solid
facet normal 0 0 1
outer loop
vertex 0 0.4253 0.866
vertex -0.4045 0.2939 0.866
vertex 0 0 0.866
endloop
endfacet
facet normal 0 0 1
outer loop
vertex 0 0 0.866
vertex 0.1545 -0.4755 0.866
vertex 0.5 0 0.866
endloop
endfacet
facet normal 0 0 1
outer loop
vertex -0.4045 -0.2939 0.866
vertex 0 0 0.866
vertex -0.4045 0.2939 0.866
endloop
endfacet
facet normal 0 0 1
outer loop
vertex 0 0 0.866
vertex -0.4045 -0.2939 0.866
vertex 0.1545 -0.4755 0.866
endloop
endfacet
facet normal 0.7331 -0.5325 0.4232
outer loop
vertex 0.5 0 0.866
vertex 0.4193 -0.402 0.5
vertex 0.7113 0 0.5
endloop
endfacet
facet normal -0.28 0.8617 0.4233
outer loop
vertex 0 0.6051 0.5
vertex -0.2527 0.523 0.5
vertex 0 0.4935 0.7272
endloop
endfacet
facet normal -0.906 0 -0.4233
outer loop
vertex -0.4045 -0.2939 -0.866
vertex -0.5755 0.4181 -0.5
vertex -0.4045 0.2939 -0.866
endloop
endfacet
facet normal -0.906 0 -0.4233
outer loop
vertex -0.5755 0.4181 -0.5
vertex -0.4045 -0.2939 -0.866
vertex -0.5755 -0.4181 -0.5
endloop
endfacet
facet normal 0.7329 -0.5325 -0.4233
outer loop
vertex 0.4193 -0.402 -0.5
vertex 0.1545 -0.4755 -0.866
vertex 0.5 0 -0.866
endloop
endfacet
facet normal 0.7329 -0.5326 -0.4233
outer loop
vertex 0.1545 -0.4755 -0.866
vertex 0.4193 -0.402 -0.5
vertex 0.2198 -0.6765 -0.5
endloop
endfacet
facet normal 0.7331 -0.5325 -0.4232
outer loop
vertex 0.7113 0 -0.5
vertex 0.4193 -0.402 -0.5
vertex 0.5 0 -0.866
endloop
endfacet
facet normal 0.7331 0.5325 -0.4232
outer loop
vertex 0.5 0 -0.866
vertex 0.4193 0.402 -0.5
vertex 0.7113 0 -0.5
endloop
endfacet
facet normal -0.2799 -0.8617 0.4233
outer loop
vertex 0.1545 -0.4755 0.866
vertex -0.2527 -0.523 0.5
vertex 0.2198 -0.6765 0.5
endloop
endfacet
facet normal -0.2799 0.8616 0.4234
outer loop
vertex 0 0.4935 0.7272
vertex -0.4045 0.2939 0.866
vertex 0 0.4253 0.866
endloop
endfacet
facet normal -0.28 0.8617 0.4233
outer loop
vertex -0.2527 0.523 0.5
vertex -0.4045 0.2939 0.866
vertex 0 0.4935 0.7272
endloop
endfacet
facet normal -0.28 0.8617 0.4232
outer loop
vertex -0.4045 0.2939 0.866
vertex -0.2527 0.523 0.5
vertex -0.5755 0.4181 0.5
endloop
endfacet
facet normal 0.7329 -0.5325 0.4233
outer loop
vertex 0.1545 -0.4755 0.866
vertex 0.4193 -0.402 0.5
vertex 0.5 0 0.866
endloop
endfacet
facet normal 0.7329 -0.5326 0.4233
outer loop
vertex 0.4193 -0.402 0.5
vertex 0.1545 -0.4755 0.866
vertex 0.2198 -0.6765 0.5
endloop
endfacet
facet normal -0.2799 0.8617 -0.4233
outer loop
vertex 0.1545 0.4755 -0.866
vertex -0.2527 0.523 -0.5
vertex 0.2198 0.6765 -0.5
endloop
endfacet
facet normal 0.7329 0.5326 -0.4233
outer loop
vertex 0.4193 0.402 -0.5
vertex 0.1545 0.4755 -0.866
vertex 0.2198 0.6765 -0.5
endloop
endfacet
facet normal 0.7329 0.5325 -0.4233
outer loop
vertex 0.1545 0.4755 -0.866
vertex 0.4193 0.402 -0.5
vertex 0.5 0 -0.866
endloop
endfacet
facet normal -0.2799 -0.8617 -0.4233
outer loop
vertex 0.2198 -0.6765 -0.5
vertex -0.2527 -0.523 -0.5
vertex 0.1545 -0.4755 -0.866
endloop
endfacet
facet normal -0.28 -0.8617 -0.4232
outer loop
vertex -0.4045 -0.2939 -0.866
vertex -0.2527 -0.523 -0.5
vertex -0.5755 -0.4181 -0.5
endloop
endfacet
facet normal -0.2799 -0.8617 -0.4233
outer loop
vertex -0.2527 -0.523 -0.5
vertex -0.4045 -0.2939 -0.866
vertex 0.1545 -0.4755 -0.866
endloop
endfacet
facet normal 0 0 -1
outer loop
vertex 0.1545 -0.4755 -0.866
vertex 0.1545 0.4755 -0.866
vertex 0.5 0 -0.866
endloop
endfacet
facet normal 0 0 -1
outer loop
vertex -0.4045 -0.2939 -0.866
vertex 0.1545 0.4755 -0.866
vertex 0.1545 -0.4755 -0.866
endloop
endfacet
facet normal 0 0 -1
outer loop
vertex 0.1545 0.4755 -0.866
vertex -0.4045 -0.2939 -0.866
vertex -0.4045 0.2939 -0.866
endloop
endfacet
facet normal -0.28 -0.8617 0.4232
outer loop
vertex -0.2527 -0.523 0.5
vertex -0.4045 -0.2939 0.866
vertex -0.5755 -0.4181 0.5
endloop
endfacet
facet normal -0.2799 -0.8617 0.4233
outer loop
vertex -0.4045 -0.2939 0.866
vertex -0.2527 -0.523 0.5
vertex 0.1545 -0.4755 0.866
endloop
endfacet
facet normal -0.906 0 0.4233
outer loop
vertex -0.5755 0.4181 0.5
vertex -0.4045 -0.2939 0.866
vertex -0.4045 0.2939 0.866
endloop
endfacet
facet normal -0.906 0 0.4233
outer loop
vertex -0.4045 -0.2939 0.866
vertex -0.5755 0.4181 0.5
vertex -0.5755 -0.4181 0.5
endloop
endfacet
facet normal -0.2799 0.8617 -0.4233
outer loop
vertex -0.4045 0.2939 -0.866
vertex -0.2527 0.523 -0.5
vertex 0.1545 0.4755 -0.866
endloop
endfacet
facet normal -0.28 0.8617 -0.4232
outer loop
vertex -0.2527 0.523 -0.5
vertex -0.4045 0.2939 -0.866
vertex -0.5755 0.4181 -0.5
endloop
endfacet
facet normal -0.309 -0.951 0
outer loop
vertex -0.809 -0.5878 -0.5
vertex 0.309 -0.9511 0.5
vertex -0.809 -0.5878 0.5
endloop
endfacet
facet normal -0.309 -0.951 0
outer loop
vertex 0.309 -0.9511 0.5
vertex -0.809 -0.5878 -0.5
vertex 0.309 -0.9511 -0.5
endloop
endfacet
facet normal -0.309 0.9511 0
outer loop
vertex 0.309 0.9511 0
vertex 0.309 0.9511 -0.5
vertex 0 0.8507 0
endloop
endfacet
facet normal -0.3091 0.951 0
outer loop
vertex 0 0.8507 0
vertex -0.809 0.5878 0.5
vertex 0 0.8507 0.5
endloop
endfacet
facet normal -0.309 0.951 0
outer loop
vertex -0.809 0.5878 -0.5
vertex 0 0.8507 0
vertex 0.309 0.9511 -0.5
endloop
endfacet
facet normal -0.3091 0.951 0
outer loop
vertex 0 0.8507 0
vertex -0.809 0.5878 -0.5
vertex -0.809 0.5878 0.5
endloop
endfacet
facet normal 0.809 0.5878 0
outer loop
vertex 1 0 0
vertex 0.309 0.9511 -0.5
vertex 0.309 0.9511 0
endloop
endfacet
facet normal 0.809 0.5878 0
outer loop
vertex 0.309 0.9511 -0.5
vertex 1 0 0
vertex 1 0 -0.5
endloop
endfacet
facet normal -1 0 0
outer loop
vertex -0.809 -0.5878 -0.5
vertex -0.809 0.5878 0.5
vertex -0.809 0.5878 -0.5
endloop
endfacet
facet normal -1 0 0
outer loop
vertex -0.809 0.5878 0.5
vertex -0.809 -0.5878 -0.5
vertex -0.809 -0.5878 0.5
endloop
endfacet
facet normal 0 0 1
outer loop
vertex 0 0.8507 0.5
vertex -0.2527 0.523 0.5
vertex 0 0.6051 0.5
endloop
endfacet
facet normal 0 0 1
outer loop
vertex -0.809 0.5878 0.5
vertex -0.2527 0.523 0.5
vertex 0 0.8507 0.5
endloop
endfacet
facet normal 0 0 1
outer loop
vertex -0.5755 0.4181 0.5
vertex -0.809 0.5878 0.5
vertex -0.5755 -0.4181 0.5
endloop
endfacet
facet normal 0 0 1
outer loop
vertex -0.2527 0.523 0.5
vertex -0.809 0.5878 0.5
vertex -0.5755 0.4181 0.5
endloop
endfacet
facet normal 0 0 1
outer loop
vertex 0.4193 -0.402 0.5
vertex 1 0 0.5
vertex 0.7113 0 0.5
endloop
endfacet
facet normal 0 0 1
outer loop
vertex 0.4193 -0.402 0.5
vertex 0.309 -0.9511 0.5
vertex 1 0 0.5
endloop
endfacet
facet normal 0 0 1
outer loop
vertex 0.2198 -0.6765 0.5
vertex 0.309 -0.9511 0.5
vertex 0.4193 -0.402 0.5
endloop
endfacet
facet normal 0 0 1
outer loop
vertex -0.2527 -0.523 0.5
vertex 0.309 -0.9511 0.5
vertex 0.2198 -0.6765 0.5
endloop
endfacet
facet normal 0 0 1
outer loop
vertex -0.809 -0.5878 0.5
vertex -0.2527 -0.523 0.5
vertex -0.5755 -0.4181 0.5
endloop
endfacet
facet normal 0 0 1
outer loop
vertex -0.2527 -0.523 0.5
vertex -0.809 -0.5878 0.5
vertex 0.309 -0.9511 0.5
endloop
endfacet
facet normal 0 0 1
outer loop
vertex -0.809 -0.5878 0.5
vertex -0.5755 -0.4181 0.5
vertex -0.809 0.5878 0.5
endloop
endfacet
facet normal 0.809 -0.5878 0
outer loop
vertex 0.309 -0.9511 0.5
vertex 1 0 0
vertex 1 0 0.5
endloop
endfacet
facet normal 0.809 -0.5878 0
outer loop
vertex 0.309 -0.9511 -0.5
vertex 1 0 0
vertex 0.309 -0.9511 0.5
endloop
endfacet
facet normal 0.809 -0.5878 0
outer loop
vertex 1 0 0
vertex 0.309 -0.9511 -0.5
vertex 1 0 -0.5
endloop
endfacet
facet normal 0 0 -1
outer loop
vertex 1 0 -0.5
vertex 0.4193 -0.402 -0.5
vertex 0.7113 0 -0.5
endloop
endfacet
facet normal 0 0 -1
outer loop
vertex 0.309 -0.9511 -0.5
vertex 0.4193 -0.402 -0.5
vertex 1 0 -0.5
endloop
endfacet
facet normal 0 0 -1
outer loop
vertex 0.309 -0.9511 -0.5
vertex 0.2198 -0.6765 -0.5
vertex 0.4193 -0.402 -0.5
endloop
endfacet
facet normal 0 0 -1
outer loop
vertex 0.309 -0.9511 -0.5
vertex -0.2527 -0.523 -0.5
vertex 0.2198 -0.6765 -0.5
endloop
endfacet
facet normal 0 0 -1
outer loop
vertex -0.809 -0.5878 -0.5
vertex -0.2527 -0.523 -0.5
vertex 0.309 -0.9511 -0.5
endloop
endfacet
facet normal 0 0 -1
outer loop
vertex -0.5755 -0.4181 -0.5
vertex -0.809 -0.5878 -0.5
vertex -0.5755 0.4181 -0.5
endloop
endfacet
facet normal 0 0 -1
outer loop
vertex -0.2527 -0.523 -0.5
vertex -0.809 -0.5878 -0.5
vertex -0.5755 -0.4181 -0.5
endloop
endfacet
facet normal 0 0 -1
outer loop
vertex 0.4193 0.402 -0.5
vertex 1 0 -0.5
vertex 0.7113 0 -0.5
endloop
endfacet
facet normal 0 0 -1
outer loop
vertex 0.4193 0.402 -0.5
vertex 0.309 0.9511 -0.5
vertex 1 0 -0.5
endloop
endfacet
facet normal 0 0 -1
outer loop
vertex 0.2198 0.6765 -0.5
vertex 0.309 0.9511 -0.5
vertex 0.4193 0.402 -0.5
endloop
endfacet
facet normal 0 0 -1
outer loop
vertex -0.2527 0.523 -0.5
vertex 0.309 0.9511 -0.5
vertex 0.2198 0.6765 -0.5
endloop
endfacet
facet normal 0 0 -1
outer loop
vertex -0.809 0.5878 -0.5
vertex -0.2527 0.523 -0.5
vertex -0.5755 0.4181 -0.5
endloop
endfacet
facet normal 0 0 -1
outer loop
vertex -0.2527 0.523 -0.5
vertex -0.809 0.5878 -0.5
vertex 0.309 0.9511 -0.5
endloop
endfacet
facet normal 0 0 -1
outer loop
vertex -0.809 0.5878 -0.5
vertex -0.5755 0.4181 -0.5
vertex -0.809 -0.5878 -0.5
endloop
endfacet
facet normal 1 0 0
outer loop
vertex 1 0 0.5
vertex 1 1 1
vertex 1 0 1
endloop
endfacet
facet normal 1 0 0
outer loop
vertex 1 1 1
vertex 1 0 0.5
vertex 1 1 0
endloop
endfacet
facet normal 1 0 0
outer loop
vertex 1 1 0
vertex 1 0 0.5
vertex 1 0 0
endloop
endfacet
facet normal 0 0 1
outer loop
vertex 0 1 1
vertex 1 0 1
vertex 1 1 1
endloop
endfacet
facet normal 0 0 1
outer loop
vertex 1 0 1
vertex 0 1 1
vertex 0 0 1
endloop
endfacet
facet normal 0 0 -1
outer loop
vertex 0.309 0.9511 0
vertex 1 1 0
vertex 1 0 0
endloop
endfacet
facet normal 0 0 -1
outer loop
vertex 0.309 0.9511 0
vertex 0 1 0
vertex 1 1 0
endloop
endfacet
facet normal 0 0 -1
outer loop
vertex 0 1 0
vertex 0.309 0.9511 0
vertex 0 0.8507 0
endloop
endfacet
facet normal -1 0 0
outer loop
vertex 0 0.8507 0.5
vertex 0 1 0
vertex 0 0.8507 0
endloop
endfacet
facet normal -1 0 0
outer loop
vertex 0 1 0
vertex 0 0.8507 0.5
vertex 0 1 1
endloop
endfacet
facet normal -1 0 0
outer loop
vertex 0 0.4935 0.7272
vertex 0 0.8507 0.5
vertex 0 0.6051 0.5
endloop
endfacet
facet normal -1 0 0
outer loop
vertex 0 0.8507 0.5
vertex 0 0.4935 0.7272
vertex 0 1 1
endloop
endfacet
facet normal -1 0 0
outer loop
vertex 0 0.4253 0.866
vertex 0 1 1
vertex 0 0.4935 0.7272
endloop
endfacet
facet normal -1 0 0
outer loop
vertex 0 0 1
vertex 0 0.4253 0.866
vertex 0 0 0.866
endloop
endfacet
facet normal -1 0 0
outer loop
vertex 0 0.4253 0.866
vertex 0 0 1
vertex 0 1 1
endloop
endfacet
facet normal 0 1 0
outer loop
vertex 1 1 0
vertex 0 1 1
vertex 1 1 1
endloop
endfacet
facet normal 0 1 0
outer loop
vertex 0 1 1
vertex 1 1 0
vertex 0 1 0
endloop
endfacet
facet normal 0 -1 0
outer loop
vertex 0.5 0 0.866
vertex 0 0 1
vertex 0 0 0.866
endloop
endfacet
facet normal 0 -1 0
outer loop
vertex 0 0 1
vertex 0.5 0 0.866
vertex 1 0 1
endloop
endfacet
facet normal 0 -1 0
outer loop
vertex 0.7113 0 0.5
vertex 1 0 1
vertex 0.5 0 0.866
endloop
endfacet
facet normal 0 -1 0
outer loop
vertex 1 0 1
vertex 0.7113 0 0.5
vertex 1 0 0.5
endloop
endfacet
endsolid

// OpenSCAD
translate(0.0, 0.0, 0.0)
{
    translate(0.0, 0.0, 0.0)
    {
        sphere(1.0);
        translate(0.0, 0.0, 0.0);
    }
    translate(0.0, 0.0, 0.0)
    {
        cylinder(h = 1.0, r = 1.0, center = true);
        translate(0.0, 0.0, 0.0)
        {
            translate(0.0, 0.0, 0.0);
        }
    }
    sphere(1.0);
    cube(1.0);
}
